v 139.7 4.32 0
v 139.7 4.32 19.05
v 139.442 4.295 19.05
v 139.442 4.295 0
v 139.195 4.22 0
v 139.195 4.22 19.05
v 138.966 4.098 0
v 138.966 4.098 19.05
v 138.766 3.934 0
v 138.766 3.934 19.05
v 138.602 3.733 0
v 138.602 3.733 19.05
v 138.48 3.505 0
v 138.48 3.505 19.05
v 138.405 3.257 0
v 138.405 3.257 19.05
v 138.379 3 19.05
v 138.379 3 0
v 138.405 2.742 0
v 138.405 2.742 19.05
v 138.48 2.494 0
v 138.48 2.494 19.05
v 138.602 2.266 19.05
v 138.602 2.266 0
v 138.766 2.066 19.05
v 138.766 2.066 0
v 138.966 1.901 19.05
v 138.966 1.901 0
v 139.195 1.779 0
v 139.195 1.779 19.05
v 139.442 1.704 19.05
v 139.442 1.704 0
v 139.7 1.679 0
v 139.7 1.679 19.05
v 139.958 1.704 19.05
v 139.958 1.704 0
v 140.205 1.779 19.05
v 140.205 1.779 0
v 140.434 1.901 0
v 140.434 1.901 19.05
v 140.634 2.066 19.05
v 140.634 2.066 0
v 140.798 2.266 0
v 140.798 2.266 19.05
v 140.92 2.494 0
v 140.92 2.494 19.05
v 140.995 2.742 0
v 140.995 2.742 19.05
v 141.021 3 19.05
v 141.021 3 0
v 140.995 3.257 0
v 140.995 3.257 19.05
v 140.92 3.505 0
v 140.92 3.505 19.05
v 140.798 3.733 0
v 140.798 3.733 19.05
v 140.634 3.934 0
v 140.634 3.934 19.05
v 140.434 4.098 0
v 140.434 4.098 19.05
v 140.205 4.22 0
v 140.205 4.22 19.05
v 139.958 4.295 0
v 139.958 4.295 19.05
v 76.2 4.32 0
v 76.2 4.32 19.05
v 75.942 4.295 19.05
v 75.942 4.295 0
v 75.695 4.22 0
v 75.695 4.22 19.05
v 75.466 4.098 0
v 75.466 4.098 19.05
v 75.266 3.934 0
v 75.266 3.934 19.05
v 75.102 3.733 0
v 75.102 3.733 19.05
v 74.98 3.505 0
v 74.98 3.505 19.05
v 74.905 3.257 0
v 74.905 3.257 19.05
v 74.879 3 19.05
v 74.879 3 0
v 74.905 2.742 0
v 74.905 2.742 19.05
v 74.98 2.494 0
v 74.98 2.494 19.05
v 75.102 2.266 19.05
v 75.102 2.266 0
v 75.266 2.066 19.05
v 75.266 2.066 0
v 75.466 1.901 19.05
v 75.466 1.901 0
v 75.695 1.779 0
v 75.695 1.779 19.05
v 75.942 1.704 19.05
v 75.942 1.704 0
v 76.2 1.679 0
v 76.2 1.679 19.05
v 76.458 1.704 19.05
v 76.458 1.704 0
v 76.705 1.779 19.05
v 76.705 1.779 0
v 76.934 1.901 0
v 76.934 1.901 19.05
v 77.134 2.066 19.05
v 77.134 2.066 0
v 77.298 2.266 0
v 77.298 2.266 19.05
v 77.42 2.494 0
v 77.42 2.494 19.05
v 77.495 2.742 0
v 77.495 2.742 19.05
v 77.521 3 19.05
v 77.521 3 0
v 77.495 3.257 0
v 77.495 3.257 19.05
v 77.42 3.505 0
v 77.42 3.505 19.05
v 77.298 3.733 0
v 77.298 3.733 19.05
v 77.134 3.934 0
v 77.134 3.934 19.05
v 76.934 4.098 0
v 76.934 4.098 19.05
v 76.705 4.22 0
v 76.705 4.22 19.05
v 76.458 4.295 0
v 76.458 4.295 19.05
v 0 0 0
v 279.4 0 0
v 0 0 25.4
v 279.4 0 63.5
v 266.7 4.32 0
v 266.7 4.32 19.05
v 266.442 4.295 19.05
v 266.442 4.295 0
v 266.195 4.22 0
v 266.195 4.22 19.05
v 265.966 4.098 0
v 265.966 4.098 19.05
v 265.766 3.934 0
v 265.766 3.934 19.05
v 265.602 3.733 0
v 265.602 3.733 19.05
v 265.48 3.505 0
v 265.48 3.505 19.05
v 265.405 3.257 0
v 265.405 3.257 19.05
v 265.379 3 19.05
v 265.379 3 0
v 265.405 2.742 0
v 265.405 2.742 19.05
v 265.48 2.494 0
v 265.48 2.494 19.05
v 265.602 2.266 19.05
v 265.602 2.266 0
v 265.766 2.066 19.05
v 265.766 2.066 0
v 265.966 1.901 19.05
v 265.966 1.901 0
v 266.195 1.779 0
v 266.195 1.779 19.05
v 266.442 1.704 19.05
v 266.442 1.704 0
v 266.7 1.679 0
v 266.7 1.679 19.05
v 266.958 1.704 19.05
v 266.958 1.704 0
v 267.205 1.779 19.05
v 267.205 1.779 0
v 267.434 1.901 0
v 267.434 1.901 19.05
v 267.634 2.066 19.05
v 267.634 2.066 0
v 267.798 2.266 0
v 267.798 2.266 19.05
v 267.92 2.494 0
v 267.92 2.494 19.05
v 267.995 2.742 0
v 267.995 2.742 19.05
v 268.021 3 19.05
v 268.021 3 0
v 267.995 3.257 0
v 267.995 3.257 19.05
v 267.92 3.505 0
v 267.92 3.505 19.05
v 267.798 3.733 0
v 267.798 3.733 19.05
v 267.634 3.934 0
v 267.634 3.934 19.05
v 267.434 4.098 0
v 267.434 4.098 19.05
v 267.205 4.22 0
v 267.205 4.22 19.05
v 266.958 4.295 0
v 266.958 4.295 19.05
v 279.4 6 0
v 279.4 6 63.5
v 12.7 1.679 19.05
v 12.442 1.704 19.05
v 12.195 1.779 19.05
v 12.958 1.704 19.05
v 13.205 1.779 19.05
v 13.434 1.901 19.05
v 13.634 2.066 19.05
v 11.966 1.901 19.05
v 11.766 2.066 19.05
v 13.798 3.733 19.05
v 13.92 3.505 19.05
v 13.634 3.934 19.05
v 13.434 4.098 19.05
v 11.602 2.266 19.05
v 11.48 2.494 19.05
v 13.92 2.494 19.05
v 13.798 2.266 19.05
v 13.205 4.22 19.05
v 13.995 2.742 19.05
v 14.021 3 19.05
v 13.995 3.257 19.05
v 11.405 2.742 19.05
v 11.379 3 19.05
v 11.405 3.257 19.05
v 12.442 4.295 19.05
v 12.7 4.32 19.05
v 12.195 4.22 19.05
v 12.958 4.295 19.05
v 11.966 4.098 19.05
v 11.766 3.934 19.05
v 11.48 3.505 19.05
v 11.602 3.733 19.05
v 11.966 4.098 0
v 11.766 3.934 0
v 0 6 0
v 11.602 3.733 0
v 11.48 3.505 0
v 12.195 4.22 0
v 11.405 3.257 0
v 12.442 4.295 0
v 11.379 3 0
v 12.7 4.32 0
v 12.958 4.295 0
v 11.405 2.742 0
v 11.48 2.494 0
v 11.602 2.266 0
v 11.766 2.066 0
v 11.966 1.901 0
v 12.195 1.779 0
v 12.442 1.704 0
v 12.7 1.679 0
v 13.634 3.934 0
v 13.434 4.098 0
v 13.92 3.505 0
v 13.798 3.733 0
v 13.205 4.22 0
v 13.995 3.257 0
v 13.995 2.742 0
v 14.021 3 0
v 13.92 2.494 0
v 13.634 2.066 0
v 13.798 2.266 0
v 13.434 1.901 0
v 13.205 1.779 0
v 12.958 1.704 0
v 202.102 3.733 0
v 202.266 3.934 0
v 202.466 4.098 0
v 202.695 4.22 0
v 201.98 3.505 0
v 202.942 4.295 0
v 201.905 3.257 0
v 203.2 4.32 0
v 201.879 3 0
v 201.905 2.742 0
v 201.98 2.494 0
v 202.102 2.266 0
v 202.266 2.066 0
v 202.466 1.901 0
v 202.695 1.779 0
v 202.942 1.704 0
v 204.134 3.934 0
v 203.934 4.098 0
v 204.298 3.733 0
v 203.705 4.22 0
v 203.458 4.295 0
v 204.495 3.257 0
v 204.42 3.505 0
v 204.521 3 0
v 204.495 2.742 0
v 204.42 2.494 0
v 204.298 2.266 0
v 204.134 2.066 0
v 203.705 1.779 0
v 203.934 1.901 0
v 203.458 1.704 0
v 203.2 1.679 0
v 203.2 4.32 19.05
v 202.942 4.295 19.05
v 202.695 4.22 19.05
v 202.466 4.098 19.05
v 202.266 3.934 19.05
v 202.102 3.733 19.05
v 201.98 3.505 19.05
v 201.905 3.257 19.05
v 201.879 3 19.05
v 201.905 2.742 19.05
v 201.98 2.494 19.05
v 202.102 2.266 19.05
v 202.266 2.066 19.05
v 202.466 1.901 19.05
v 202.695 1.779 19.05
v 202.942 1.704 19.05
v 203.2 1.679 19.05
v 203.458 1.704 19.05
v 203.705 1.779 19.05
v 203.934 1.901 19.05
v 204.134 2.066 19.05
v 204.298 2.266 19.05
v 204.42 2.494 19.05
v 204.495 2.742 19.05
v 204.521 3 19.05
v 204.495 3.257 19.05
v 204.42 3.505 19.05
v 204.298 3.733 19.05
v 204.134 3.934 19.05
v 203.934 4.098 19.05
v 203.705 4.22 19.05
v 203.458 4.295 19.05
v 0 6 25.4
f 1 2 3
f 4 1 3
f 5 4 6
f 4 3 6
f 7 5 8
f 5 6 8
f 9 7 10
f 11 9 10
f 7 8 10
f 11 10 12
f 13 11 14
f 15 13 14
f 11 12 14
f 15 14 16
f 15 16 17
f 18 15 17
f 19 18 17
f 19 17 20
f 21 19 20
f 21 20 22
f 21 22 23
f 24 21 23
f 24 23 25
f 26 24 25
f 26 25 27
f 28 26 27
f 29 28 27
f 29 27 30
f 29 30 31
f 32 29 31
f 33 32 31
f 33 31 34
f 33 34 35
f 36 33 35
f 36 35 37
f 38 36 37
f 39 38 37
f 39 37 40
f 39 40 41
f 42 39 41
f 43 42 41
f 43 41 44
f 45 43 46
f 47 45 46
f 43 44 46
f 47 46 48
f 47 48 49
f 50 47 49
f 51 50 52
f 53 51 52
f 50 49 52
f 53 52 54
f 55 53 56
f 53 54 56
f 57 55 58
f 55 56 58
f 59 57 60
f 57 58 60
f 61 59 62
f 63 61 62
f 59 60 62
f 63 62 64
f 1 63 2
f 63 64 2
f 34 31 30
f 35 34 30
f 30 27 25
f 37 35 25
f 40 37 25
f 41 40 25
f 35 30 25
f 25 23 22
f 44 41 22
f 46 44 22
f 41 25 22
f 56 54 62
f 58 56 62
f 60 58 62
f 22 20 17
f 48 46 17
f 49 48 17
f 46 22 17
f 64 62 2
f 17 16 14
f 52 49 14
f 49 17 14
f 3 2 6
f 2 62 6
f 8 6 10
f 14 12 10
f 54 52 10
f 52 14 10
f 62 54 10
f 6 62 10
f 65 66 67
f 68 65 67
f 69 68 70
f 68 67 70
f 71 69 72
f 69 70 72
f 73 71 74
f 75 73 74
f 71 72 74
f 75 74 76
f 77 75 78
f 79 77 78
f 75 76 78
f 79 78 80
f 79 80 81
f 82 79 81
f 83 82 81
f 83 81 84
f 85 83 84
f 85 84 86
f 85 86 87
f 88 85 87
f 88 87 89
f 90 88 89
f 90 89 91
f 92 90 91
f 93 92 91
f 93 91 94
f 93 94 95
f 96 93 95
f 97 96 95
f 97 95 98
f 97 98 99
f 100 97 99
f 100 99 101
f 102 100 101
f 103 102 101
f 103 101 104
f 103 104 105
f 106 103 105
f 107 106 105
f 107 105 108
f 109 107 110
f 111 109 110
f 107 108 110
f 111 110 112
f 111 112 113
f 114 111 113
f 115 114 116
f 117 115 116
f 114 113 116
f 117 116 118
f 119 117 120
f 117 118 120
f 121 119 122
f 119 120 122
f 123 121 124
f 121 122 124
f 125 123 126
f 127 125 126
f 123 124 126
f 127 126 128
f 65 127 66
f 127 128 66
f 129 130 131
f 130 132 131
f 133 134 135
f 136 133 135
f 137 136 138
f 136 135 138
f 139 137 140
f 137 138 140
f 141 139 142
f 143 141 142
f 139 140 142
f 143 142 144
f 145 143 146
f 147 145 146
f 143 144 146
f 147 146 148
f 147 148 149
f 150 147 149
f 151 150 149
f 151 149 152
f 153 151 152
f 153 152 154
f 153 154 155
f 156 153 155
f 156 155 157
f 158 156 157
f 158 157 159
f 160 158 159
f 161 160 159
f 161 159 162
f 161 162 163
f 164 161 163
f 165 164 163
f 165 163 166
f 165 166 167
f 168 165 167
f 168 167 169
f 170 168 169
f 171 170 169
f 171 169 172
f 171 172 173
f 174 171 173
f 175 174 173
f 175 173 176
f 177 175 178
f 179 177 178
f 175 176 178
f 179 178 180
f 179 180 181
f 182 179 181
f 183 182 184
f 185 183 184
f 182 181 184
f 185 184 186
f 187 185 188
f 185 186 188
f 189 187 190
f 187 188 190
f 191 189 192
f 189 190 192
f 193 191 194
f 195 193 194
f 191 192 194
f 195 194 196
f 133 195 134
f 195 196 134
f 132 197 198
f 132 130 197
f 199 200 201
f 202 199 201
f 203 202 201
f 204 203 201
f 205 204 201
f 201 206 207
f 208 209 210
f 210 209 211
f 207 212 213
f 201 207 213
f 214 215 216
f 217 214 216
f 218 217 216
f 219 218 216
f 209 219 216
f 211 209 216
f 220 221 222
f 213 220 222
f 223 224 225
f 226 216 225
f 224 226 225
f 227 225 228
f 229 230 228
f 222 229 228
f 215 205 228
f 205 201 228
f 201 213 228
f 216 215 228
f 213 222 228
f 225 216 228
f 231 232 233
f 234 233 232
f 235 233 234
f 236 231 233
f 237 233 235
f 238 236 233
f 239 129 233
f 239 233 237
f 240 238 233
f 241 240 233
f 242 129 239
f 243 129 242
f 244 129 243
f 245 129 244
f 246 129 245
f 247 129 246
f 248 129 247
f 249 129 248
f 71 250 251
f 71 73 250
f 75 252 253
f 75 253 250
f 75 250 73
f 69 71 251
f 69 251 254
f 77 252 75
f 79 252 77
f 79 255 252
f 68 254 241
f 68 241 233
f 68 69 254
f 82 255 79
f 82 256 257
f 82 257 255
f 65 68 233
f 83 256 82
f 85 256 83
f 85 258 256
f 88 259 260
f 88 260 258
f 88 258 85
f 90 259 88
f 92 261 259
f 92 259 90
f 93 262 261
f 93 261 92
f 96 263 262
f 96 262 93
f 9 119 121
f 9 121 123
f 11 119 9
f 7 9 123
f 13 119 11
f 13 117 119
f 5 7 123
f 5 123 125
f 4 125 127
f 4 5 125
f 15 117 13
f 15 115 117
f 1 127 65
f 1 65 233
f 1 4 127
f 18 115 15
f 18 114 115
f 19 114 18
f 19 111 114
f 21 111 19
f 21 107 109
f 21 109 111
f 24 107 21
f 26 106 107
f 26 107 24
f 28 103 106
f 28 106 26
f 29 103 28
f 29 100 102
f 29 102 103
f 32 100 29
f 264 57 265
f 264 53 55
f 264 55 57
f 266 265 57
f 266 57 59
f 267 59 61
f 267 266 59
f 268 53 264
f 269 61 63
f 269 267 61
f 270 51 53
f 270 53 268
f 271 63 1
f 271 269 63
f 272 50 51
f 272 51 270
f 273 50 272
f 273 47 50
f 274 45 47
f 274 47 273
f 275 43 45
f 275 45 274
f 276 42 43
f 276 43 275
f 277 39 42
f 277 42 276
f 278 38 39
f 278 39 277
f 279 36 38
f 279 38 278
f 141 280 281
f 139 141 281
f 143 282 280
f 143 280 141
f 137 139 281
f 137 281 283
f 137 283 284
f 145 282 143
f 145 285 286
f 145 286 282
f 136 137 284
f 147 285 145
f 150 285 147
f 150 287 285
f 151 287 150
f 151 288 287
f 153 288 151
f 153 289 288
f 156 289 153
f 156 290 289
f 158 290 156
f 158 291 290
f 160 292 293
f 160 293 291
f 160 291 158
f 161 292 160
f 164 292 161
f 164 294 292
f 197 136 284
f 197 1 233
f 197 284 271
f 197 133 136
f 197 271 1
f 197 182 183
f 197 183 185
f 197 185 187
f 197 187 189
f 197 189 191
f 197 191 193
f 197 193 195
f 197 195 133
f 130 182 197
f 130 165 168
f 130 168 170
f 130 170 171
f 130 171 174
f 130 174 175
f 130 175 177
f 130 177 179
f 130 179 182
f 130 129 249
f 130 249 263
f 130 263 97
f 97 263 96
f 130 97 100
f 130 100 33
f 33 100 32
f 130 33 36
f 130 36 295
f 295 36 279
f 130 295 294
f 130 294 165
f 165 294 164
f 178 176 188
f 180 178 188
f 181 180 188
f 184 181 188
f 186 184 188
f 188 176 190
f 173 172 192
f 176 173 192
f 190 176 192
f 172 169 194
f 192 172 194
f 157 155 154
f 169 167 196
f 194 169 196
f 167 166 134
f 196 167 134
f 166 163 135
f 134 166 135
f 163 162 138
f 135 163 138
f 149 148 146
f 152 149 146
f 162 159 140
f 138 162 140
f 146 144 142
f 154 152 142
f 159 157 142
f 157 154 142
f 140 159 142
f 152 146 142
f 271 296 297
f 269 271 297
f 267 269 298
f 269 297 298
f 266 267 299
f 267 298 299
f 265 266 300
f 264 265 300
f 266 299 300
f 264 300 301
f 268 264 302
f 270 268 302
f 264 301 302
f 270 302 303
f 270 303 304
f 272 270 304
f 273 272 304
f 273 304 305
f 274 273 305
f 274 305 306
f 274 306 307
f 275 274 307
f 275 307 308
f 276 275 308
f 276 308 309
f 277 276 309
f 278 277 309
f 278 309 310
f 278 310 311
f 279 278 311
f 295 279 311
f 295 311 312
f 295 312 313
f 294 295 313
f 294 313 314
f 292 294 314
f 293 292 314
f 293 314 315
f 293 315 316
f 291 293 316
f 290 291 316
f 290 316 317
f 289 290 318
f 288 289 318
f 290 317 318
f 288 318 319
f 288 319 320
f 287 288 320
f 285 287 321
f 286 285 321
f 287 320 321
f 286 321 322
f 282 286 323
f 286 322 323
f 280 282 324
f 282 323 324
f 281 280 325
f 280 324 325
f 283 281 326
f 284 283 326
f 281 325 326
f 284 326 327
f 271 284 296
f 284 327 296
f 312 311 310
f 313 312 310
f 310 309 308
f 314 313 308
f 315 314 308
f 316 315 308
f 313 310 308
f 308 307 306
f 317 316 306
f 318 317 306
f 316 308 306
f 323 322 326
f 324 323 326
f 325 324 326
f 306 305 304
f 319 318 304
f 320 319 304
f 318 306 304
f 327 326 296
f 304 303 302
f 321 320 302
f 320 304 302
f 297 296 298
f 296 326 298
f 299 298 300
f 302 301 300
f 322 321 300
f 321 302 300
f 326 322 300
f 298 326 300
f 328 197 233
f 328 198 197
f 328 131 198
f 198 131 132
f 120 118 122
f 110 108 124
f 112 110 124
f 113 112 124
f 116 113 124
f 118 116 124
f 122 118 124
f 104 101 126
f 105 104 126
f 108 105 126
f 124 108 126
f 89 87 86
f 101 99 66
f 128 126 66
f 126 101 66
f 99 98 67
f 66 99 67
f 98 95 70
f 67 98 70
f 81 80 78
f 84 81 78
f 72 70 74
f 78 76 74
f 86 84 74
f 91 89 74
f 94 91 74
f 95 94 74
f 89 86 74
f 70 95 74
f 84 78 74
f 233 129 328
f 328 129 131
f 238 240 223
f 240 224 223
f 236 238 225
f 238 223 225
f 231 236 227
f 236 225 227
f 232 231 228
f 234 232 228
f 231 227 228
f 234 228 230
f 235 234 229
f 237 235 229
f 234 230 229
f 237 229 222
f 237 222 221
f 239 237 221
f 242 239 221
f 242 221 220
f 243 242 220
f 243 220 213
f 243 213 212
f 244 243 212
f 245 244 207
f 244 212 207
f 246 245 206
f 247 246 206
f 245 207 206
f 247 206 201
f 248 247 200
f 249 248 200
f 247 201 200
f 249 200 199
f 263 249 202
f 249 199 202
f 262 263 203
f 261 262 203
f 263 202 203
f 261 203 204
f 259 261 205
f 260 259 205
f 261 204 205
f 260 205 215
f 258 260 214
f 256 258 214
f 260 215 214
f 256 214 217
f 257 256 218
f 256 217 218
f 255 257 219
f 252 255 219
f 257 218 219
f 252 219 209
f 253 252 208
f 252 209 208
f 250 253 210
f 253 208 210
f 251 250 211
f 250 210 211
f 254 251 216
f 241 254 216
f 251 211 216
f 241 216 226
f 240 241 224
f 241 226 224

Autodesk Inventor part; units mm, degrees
ref_plane "YZ Plane" through (0, 0, 0) normal (1, 0, 0) x (0, 1, 0)
ref_plane "XZ Plane" through (0, 0, 0) normal (0, 1, 0) x (-1, 0, 0)
ref_plane "XY Plane" through (0, 0, 0) normal (0, 0, 1) x (1, 0, 0)
sketch "Sketch1" plane through (0, 0, 0) normal (0, 1, 0) x (-1, 0, 0)
  line L0 (0, 0) -> (0, 25.4)
  line L1 (0, 0) -> (-279.4, 0)
  line L2 (-279.4, 0) -> (-279.4, 63.5)
  line L3 (0, 25.4) -> (-279.4, 63.5)
  dimension "d0" = 279.4
  dimension "d1" = 25.4
  dimension "d2" = 63.5
extrude "Extrusion1" add sketch "Sketch1" along normal blind 5.9995
sketch "Sketch2" plane through (279.4, 0, 0) normal (0, 0, -1) x (-1, 0, 0)
  line L0 (0, 0) -> (0, 5.9995) projected
  line L1 (279.4, 0) -> (279.4, 5.9995) projected
  line L2 (0, 0) -> (279.4, 0) projected
  point P0 (12.7, 2.9997)
  point P1 (76.2, 2.9997)
  point P2 (139.7, 2.9997)
  point P3 (203.2, 2.9997)
  point P4 (266.7, 2.9997)
  dimension "d5" = 12.7
  dimension "d6" = 12.7
  dimension "d7" = 2.9997
  dimension "d8" = 63.5
  dimension "d9" = 63.5
  dimension "d10" = 63.5
  dimension "d11" = 63.5
hole "Hole1" at (266.7, 2.9997, 0) at (203.2, 2.9997, 0) at (139.7, 2.9997, 0) at (76.2, 2.9997, 0) at (12.7, 2.9997, 0) direction (0, 0, 1) diameter 2.6416 depth 19.05 thread size "6-32 UNC" class "2B" standard "ANSI Unified Screw Threads"
properties part number "Mount_Support"
